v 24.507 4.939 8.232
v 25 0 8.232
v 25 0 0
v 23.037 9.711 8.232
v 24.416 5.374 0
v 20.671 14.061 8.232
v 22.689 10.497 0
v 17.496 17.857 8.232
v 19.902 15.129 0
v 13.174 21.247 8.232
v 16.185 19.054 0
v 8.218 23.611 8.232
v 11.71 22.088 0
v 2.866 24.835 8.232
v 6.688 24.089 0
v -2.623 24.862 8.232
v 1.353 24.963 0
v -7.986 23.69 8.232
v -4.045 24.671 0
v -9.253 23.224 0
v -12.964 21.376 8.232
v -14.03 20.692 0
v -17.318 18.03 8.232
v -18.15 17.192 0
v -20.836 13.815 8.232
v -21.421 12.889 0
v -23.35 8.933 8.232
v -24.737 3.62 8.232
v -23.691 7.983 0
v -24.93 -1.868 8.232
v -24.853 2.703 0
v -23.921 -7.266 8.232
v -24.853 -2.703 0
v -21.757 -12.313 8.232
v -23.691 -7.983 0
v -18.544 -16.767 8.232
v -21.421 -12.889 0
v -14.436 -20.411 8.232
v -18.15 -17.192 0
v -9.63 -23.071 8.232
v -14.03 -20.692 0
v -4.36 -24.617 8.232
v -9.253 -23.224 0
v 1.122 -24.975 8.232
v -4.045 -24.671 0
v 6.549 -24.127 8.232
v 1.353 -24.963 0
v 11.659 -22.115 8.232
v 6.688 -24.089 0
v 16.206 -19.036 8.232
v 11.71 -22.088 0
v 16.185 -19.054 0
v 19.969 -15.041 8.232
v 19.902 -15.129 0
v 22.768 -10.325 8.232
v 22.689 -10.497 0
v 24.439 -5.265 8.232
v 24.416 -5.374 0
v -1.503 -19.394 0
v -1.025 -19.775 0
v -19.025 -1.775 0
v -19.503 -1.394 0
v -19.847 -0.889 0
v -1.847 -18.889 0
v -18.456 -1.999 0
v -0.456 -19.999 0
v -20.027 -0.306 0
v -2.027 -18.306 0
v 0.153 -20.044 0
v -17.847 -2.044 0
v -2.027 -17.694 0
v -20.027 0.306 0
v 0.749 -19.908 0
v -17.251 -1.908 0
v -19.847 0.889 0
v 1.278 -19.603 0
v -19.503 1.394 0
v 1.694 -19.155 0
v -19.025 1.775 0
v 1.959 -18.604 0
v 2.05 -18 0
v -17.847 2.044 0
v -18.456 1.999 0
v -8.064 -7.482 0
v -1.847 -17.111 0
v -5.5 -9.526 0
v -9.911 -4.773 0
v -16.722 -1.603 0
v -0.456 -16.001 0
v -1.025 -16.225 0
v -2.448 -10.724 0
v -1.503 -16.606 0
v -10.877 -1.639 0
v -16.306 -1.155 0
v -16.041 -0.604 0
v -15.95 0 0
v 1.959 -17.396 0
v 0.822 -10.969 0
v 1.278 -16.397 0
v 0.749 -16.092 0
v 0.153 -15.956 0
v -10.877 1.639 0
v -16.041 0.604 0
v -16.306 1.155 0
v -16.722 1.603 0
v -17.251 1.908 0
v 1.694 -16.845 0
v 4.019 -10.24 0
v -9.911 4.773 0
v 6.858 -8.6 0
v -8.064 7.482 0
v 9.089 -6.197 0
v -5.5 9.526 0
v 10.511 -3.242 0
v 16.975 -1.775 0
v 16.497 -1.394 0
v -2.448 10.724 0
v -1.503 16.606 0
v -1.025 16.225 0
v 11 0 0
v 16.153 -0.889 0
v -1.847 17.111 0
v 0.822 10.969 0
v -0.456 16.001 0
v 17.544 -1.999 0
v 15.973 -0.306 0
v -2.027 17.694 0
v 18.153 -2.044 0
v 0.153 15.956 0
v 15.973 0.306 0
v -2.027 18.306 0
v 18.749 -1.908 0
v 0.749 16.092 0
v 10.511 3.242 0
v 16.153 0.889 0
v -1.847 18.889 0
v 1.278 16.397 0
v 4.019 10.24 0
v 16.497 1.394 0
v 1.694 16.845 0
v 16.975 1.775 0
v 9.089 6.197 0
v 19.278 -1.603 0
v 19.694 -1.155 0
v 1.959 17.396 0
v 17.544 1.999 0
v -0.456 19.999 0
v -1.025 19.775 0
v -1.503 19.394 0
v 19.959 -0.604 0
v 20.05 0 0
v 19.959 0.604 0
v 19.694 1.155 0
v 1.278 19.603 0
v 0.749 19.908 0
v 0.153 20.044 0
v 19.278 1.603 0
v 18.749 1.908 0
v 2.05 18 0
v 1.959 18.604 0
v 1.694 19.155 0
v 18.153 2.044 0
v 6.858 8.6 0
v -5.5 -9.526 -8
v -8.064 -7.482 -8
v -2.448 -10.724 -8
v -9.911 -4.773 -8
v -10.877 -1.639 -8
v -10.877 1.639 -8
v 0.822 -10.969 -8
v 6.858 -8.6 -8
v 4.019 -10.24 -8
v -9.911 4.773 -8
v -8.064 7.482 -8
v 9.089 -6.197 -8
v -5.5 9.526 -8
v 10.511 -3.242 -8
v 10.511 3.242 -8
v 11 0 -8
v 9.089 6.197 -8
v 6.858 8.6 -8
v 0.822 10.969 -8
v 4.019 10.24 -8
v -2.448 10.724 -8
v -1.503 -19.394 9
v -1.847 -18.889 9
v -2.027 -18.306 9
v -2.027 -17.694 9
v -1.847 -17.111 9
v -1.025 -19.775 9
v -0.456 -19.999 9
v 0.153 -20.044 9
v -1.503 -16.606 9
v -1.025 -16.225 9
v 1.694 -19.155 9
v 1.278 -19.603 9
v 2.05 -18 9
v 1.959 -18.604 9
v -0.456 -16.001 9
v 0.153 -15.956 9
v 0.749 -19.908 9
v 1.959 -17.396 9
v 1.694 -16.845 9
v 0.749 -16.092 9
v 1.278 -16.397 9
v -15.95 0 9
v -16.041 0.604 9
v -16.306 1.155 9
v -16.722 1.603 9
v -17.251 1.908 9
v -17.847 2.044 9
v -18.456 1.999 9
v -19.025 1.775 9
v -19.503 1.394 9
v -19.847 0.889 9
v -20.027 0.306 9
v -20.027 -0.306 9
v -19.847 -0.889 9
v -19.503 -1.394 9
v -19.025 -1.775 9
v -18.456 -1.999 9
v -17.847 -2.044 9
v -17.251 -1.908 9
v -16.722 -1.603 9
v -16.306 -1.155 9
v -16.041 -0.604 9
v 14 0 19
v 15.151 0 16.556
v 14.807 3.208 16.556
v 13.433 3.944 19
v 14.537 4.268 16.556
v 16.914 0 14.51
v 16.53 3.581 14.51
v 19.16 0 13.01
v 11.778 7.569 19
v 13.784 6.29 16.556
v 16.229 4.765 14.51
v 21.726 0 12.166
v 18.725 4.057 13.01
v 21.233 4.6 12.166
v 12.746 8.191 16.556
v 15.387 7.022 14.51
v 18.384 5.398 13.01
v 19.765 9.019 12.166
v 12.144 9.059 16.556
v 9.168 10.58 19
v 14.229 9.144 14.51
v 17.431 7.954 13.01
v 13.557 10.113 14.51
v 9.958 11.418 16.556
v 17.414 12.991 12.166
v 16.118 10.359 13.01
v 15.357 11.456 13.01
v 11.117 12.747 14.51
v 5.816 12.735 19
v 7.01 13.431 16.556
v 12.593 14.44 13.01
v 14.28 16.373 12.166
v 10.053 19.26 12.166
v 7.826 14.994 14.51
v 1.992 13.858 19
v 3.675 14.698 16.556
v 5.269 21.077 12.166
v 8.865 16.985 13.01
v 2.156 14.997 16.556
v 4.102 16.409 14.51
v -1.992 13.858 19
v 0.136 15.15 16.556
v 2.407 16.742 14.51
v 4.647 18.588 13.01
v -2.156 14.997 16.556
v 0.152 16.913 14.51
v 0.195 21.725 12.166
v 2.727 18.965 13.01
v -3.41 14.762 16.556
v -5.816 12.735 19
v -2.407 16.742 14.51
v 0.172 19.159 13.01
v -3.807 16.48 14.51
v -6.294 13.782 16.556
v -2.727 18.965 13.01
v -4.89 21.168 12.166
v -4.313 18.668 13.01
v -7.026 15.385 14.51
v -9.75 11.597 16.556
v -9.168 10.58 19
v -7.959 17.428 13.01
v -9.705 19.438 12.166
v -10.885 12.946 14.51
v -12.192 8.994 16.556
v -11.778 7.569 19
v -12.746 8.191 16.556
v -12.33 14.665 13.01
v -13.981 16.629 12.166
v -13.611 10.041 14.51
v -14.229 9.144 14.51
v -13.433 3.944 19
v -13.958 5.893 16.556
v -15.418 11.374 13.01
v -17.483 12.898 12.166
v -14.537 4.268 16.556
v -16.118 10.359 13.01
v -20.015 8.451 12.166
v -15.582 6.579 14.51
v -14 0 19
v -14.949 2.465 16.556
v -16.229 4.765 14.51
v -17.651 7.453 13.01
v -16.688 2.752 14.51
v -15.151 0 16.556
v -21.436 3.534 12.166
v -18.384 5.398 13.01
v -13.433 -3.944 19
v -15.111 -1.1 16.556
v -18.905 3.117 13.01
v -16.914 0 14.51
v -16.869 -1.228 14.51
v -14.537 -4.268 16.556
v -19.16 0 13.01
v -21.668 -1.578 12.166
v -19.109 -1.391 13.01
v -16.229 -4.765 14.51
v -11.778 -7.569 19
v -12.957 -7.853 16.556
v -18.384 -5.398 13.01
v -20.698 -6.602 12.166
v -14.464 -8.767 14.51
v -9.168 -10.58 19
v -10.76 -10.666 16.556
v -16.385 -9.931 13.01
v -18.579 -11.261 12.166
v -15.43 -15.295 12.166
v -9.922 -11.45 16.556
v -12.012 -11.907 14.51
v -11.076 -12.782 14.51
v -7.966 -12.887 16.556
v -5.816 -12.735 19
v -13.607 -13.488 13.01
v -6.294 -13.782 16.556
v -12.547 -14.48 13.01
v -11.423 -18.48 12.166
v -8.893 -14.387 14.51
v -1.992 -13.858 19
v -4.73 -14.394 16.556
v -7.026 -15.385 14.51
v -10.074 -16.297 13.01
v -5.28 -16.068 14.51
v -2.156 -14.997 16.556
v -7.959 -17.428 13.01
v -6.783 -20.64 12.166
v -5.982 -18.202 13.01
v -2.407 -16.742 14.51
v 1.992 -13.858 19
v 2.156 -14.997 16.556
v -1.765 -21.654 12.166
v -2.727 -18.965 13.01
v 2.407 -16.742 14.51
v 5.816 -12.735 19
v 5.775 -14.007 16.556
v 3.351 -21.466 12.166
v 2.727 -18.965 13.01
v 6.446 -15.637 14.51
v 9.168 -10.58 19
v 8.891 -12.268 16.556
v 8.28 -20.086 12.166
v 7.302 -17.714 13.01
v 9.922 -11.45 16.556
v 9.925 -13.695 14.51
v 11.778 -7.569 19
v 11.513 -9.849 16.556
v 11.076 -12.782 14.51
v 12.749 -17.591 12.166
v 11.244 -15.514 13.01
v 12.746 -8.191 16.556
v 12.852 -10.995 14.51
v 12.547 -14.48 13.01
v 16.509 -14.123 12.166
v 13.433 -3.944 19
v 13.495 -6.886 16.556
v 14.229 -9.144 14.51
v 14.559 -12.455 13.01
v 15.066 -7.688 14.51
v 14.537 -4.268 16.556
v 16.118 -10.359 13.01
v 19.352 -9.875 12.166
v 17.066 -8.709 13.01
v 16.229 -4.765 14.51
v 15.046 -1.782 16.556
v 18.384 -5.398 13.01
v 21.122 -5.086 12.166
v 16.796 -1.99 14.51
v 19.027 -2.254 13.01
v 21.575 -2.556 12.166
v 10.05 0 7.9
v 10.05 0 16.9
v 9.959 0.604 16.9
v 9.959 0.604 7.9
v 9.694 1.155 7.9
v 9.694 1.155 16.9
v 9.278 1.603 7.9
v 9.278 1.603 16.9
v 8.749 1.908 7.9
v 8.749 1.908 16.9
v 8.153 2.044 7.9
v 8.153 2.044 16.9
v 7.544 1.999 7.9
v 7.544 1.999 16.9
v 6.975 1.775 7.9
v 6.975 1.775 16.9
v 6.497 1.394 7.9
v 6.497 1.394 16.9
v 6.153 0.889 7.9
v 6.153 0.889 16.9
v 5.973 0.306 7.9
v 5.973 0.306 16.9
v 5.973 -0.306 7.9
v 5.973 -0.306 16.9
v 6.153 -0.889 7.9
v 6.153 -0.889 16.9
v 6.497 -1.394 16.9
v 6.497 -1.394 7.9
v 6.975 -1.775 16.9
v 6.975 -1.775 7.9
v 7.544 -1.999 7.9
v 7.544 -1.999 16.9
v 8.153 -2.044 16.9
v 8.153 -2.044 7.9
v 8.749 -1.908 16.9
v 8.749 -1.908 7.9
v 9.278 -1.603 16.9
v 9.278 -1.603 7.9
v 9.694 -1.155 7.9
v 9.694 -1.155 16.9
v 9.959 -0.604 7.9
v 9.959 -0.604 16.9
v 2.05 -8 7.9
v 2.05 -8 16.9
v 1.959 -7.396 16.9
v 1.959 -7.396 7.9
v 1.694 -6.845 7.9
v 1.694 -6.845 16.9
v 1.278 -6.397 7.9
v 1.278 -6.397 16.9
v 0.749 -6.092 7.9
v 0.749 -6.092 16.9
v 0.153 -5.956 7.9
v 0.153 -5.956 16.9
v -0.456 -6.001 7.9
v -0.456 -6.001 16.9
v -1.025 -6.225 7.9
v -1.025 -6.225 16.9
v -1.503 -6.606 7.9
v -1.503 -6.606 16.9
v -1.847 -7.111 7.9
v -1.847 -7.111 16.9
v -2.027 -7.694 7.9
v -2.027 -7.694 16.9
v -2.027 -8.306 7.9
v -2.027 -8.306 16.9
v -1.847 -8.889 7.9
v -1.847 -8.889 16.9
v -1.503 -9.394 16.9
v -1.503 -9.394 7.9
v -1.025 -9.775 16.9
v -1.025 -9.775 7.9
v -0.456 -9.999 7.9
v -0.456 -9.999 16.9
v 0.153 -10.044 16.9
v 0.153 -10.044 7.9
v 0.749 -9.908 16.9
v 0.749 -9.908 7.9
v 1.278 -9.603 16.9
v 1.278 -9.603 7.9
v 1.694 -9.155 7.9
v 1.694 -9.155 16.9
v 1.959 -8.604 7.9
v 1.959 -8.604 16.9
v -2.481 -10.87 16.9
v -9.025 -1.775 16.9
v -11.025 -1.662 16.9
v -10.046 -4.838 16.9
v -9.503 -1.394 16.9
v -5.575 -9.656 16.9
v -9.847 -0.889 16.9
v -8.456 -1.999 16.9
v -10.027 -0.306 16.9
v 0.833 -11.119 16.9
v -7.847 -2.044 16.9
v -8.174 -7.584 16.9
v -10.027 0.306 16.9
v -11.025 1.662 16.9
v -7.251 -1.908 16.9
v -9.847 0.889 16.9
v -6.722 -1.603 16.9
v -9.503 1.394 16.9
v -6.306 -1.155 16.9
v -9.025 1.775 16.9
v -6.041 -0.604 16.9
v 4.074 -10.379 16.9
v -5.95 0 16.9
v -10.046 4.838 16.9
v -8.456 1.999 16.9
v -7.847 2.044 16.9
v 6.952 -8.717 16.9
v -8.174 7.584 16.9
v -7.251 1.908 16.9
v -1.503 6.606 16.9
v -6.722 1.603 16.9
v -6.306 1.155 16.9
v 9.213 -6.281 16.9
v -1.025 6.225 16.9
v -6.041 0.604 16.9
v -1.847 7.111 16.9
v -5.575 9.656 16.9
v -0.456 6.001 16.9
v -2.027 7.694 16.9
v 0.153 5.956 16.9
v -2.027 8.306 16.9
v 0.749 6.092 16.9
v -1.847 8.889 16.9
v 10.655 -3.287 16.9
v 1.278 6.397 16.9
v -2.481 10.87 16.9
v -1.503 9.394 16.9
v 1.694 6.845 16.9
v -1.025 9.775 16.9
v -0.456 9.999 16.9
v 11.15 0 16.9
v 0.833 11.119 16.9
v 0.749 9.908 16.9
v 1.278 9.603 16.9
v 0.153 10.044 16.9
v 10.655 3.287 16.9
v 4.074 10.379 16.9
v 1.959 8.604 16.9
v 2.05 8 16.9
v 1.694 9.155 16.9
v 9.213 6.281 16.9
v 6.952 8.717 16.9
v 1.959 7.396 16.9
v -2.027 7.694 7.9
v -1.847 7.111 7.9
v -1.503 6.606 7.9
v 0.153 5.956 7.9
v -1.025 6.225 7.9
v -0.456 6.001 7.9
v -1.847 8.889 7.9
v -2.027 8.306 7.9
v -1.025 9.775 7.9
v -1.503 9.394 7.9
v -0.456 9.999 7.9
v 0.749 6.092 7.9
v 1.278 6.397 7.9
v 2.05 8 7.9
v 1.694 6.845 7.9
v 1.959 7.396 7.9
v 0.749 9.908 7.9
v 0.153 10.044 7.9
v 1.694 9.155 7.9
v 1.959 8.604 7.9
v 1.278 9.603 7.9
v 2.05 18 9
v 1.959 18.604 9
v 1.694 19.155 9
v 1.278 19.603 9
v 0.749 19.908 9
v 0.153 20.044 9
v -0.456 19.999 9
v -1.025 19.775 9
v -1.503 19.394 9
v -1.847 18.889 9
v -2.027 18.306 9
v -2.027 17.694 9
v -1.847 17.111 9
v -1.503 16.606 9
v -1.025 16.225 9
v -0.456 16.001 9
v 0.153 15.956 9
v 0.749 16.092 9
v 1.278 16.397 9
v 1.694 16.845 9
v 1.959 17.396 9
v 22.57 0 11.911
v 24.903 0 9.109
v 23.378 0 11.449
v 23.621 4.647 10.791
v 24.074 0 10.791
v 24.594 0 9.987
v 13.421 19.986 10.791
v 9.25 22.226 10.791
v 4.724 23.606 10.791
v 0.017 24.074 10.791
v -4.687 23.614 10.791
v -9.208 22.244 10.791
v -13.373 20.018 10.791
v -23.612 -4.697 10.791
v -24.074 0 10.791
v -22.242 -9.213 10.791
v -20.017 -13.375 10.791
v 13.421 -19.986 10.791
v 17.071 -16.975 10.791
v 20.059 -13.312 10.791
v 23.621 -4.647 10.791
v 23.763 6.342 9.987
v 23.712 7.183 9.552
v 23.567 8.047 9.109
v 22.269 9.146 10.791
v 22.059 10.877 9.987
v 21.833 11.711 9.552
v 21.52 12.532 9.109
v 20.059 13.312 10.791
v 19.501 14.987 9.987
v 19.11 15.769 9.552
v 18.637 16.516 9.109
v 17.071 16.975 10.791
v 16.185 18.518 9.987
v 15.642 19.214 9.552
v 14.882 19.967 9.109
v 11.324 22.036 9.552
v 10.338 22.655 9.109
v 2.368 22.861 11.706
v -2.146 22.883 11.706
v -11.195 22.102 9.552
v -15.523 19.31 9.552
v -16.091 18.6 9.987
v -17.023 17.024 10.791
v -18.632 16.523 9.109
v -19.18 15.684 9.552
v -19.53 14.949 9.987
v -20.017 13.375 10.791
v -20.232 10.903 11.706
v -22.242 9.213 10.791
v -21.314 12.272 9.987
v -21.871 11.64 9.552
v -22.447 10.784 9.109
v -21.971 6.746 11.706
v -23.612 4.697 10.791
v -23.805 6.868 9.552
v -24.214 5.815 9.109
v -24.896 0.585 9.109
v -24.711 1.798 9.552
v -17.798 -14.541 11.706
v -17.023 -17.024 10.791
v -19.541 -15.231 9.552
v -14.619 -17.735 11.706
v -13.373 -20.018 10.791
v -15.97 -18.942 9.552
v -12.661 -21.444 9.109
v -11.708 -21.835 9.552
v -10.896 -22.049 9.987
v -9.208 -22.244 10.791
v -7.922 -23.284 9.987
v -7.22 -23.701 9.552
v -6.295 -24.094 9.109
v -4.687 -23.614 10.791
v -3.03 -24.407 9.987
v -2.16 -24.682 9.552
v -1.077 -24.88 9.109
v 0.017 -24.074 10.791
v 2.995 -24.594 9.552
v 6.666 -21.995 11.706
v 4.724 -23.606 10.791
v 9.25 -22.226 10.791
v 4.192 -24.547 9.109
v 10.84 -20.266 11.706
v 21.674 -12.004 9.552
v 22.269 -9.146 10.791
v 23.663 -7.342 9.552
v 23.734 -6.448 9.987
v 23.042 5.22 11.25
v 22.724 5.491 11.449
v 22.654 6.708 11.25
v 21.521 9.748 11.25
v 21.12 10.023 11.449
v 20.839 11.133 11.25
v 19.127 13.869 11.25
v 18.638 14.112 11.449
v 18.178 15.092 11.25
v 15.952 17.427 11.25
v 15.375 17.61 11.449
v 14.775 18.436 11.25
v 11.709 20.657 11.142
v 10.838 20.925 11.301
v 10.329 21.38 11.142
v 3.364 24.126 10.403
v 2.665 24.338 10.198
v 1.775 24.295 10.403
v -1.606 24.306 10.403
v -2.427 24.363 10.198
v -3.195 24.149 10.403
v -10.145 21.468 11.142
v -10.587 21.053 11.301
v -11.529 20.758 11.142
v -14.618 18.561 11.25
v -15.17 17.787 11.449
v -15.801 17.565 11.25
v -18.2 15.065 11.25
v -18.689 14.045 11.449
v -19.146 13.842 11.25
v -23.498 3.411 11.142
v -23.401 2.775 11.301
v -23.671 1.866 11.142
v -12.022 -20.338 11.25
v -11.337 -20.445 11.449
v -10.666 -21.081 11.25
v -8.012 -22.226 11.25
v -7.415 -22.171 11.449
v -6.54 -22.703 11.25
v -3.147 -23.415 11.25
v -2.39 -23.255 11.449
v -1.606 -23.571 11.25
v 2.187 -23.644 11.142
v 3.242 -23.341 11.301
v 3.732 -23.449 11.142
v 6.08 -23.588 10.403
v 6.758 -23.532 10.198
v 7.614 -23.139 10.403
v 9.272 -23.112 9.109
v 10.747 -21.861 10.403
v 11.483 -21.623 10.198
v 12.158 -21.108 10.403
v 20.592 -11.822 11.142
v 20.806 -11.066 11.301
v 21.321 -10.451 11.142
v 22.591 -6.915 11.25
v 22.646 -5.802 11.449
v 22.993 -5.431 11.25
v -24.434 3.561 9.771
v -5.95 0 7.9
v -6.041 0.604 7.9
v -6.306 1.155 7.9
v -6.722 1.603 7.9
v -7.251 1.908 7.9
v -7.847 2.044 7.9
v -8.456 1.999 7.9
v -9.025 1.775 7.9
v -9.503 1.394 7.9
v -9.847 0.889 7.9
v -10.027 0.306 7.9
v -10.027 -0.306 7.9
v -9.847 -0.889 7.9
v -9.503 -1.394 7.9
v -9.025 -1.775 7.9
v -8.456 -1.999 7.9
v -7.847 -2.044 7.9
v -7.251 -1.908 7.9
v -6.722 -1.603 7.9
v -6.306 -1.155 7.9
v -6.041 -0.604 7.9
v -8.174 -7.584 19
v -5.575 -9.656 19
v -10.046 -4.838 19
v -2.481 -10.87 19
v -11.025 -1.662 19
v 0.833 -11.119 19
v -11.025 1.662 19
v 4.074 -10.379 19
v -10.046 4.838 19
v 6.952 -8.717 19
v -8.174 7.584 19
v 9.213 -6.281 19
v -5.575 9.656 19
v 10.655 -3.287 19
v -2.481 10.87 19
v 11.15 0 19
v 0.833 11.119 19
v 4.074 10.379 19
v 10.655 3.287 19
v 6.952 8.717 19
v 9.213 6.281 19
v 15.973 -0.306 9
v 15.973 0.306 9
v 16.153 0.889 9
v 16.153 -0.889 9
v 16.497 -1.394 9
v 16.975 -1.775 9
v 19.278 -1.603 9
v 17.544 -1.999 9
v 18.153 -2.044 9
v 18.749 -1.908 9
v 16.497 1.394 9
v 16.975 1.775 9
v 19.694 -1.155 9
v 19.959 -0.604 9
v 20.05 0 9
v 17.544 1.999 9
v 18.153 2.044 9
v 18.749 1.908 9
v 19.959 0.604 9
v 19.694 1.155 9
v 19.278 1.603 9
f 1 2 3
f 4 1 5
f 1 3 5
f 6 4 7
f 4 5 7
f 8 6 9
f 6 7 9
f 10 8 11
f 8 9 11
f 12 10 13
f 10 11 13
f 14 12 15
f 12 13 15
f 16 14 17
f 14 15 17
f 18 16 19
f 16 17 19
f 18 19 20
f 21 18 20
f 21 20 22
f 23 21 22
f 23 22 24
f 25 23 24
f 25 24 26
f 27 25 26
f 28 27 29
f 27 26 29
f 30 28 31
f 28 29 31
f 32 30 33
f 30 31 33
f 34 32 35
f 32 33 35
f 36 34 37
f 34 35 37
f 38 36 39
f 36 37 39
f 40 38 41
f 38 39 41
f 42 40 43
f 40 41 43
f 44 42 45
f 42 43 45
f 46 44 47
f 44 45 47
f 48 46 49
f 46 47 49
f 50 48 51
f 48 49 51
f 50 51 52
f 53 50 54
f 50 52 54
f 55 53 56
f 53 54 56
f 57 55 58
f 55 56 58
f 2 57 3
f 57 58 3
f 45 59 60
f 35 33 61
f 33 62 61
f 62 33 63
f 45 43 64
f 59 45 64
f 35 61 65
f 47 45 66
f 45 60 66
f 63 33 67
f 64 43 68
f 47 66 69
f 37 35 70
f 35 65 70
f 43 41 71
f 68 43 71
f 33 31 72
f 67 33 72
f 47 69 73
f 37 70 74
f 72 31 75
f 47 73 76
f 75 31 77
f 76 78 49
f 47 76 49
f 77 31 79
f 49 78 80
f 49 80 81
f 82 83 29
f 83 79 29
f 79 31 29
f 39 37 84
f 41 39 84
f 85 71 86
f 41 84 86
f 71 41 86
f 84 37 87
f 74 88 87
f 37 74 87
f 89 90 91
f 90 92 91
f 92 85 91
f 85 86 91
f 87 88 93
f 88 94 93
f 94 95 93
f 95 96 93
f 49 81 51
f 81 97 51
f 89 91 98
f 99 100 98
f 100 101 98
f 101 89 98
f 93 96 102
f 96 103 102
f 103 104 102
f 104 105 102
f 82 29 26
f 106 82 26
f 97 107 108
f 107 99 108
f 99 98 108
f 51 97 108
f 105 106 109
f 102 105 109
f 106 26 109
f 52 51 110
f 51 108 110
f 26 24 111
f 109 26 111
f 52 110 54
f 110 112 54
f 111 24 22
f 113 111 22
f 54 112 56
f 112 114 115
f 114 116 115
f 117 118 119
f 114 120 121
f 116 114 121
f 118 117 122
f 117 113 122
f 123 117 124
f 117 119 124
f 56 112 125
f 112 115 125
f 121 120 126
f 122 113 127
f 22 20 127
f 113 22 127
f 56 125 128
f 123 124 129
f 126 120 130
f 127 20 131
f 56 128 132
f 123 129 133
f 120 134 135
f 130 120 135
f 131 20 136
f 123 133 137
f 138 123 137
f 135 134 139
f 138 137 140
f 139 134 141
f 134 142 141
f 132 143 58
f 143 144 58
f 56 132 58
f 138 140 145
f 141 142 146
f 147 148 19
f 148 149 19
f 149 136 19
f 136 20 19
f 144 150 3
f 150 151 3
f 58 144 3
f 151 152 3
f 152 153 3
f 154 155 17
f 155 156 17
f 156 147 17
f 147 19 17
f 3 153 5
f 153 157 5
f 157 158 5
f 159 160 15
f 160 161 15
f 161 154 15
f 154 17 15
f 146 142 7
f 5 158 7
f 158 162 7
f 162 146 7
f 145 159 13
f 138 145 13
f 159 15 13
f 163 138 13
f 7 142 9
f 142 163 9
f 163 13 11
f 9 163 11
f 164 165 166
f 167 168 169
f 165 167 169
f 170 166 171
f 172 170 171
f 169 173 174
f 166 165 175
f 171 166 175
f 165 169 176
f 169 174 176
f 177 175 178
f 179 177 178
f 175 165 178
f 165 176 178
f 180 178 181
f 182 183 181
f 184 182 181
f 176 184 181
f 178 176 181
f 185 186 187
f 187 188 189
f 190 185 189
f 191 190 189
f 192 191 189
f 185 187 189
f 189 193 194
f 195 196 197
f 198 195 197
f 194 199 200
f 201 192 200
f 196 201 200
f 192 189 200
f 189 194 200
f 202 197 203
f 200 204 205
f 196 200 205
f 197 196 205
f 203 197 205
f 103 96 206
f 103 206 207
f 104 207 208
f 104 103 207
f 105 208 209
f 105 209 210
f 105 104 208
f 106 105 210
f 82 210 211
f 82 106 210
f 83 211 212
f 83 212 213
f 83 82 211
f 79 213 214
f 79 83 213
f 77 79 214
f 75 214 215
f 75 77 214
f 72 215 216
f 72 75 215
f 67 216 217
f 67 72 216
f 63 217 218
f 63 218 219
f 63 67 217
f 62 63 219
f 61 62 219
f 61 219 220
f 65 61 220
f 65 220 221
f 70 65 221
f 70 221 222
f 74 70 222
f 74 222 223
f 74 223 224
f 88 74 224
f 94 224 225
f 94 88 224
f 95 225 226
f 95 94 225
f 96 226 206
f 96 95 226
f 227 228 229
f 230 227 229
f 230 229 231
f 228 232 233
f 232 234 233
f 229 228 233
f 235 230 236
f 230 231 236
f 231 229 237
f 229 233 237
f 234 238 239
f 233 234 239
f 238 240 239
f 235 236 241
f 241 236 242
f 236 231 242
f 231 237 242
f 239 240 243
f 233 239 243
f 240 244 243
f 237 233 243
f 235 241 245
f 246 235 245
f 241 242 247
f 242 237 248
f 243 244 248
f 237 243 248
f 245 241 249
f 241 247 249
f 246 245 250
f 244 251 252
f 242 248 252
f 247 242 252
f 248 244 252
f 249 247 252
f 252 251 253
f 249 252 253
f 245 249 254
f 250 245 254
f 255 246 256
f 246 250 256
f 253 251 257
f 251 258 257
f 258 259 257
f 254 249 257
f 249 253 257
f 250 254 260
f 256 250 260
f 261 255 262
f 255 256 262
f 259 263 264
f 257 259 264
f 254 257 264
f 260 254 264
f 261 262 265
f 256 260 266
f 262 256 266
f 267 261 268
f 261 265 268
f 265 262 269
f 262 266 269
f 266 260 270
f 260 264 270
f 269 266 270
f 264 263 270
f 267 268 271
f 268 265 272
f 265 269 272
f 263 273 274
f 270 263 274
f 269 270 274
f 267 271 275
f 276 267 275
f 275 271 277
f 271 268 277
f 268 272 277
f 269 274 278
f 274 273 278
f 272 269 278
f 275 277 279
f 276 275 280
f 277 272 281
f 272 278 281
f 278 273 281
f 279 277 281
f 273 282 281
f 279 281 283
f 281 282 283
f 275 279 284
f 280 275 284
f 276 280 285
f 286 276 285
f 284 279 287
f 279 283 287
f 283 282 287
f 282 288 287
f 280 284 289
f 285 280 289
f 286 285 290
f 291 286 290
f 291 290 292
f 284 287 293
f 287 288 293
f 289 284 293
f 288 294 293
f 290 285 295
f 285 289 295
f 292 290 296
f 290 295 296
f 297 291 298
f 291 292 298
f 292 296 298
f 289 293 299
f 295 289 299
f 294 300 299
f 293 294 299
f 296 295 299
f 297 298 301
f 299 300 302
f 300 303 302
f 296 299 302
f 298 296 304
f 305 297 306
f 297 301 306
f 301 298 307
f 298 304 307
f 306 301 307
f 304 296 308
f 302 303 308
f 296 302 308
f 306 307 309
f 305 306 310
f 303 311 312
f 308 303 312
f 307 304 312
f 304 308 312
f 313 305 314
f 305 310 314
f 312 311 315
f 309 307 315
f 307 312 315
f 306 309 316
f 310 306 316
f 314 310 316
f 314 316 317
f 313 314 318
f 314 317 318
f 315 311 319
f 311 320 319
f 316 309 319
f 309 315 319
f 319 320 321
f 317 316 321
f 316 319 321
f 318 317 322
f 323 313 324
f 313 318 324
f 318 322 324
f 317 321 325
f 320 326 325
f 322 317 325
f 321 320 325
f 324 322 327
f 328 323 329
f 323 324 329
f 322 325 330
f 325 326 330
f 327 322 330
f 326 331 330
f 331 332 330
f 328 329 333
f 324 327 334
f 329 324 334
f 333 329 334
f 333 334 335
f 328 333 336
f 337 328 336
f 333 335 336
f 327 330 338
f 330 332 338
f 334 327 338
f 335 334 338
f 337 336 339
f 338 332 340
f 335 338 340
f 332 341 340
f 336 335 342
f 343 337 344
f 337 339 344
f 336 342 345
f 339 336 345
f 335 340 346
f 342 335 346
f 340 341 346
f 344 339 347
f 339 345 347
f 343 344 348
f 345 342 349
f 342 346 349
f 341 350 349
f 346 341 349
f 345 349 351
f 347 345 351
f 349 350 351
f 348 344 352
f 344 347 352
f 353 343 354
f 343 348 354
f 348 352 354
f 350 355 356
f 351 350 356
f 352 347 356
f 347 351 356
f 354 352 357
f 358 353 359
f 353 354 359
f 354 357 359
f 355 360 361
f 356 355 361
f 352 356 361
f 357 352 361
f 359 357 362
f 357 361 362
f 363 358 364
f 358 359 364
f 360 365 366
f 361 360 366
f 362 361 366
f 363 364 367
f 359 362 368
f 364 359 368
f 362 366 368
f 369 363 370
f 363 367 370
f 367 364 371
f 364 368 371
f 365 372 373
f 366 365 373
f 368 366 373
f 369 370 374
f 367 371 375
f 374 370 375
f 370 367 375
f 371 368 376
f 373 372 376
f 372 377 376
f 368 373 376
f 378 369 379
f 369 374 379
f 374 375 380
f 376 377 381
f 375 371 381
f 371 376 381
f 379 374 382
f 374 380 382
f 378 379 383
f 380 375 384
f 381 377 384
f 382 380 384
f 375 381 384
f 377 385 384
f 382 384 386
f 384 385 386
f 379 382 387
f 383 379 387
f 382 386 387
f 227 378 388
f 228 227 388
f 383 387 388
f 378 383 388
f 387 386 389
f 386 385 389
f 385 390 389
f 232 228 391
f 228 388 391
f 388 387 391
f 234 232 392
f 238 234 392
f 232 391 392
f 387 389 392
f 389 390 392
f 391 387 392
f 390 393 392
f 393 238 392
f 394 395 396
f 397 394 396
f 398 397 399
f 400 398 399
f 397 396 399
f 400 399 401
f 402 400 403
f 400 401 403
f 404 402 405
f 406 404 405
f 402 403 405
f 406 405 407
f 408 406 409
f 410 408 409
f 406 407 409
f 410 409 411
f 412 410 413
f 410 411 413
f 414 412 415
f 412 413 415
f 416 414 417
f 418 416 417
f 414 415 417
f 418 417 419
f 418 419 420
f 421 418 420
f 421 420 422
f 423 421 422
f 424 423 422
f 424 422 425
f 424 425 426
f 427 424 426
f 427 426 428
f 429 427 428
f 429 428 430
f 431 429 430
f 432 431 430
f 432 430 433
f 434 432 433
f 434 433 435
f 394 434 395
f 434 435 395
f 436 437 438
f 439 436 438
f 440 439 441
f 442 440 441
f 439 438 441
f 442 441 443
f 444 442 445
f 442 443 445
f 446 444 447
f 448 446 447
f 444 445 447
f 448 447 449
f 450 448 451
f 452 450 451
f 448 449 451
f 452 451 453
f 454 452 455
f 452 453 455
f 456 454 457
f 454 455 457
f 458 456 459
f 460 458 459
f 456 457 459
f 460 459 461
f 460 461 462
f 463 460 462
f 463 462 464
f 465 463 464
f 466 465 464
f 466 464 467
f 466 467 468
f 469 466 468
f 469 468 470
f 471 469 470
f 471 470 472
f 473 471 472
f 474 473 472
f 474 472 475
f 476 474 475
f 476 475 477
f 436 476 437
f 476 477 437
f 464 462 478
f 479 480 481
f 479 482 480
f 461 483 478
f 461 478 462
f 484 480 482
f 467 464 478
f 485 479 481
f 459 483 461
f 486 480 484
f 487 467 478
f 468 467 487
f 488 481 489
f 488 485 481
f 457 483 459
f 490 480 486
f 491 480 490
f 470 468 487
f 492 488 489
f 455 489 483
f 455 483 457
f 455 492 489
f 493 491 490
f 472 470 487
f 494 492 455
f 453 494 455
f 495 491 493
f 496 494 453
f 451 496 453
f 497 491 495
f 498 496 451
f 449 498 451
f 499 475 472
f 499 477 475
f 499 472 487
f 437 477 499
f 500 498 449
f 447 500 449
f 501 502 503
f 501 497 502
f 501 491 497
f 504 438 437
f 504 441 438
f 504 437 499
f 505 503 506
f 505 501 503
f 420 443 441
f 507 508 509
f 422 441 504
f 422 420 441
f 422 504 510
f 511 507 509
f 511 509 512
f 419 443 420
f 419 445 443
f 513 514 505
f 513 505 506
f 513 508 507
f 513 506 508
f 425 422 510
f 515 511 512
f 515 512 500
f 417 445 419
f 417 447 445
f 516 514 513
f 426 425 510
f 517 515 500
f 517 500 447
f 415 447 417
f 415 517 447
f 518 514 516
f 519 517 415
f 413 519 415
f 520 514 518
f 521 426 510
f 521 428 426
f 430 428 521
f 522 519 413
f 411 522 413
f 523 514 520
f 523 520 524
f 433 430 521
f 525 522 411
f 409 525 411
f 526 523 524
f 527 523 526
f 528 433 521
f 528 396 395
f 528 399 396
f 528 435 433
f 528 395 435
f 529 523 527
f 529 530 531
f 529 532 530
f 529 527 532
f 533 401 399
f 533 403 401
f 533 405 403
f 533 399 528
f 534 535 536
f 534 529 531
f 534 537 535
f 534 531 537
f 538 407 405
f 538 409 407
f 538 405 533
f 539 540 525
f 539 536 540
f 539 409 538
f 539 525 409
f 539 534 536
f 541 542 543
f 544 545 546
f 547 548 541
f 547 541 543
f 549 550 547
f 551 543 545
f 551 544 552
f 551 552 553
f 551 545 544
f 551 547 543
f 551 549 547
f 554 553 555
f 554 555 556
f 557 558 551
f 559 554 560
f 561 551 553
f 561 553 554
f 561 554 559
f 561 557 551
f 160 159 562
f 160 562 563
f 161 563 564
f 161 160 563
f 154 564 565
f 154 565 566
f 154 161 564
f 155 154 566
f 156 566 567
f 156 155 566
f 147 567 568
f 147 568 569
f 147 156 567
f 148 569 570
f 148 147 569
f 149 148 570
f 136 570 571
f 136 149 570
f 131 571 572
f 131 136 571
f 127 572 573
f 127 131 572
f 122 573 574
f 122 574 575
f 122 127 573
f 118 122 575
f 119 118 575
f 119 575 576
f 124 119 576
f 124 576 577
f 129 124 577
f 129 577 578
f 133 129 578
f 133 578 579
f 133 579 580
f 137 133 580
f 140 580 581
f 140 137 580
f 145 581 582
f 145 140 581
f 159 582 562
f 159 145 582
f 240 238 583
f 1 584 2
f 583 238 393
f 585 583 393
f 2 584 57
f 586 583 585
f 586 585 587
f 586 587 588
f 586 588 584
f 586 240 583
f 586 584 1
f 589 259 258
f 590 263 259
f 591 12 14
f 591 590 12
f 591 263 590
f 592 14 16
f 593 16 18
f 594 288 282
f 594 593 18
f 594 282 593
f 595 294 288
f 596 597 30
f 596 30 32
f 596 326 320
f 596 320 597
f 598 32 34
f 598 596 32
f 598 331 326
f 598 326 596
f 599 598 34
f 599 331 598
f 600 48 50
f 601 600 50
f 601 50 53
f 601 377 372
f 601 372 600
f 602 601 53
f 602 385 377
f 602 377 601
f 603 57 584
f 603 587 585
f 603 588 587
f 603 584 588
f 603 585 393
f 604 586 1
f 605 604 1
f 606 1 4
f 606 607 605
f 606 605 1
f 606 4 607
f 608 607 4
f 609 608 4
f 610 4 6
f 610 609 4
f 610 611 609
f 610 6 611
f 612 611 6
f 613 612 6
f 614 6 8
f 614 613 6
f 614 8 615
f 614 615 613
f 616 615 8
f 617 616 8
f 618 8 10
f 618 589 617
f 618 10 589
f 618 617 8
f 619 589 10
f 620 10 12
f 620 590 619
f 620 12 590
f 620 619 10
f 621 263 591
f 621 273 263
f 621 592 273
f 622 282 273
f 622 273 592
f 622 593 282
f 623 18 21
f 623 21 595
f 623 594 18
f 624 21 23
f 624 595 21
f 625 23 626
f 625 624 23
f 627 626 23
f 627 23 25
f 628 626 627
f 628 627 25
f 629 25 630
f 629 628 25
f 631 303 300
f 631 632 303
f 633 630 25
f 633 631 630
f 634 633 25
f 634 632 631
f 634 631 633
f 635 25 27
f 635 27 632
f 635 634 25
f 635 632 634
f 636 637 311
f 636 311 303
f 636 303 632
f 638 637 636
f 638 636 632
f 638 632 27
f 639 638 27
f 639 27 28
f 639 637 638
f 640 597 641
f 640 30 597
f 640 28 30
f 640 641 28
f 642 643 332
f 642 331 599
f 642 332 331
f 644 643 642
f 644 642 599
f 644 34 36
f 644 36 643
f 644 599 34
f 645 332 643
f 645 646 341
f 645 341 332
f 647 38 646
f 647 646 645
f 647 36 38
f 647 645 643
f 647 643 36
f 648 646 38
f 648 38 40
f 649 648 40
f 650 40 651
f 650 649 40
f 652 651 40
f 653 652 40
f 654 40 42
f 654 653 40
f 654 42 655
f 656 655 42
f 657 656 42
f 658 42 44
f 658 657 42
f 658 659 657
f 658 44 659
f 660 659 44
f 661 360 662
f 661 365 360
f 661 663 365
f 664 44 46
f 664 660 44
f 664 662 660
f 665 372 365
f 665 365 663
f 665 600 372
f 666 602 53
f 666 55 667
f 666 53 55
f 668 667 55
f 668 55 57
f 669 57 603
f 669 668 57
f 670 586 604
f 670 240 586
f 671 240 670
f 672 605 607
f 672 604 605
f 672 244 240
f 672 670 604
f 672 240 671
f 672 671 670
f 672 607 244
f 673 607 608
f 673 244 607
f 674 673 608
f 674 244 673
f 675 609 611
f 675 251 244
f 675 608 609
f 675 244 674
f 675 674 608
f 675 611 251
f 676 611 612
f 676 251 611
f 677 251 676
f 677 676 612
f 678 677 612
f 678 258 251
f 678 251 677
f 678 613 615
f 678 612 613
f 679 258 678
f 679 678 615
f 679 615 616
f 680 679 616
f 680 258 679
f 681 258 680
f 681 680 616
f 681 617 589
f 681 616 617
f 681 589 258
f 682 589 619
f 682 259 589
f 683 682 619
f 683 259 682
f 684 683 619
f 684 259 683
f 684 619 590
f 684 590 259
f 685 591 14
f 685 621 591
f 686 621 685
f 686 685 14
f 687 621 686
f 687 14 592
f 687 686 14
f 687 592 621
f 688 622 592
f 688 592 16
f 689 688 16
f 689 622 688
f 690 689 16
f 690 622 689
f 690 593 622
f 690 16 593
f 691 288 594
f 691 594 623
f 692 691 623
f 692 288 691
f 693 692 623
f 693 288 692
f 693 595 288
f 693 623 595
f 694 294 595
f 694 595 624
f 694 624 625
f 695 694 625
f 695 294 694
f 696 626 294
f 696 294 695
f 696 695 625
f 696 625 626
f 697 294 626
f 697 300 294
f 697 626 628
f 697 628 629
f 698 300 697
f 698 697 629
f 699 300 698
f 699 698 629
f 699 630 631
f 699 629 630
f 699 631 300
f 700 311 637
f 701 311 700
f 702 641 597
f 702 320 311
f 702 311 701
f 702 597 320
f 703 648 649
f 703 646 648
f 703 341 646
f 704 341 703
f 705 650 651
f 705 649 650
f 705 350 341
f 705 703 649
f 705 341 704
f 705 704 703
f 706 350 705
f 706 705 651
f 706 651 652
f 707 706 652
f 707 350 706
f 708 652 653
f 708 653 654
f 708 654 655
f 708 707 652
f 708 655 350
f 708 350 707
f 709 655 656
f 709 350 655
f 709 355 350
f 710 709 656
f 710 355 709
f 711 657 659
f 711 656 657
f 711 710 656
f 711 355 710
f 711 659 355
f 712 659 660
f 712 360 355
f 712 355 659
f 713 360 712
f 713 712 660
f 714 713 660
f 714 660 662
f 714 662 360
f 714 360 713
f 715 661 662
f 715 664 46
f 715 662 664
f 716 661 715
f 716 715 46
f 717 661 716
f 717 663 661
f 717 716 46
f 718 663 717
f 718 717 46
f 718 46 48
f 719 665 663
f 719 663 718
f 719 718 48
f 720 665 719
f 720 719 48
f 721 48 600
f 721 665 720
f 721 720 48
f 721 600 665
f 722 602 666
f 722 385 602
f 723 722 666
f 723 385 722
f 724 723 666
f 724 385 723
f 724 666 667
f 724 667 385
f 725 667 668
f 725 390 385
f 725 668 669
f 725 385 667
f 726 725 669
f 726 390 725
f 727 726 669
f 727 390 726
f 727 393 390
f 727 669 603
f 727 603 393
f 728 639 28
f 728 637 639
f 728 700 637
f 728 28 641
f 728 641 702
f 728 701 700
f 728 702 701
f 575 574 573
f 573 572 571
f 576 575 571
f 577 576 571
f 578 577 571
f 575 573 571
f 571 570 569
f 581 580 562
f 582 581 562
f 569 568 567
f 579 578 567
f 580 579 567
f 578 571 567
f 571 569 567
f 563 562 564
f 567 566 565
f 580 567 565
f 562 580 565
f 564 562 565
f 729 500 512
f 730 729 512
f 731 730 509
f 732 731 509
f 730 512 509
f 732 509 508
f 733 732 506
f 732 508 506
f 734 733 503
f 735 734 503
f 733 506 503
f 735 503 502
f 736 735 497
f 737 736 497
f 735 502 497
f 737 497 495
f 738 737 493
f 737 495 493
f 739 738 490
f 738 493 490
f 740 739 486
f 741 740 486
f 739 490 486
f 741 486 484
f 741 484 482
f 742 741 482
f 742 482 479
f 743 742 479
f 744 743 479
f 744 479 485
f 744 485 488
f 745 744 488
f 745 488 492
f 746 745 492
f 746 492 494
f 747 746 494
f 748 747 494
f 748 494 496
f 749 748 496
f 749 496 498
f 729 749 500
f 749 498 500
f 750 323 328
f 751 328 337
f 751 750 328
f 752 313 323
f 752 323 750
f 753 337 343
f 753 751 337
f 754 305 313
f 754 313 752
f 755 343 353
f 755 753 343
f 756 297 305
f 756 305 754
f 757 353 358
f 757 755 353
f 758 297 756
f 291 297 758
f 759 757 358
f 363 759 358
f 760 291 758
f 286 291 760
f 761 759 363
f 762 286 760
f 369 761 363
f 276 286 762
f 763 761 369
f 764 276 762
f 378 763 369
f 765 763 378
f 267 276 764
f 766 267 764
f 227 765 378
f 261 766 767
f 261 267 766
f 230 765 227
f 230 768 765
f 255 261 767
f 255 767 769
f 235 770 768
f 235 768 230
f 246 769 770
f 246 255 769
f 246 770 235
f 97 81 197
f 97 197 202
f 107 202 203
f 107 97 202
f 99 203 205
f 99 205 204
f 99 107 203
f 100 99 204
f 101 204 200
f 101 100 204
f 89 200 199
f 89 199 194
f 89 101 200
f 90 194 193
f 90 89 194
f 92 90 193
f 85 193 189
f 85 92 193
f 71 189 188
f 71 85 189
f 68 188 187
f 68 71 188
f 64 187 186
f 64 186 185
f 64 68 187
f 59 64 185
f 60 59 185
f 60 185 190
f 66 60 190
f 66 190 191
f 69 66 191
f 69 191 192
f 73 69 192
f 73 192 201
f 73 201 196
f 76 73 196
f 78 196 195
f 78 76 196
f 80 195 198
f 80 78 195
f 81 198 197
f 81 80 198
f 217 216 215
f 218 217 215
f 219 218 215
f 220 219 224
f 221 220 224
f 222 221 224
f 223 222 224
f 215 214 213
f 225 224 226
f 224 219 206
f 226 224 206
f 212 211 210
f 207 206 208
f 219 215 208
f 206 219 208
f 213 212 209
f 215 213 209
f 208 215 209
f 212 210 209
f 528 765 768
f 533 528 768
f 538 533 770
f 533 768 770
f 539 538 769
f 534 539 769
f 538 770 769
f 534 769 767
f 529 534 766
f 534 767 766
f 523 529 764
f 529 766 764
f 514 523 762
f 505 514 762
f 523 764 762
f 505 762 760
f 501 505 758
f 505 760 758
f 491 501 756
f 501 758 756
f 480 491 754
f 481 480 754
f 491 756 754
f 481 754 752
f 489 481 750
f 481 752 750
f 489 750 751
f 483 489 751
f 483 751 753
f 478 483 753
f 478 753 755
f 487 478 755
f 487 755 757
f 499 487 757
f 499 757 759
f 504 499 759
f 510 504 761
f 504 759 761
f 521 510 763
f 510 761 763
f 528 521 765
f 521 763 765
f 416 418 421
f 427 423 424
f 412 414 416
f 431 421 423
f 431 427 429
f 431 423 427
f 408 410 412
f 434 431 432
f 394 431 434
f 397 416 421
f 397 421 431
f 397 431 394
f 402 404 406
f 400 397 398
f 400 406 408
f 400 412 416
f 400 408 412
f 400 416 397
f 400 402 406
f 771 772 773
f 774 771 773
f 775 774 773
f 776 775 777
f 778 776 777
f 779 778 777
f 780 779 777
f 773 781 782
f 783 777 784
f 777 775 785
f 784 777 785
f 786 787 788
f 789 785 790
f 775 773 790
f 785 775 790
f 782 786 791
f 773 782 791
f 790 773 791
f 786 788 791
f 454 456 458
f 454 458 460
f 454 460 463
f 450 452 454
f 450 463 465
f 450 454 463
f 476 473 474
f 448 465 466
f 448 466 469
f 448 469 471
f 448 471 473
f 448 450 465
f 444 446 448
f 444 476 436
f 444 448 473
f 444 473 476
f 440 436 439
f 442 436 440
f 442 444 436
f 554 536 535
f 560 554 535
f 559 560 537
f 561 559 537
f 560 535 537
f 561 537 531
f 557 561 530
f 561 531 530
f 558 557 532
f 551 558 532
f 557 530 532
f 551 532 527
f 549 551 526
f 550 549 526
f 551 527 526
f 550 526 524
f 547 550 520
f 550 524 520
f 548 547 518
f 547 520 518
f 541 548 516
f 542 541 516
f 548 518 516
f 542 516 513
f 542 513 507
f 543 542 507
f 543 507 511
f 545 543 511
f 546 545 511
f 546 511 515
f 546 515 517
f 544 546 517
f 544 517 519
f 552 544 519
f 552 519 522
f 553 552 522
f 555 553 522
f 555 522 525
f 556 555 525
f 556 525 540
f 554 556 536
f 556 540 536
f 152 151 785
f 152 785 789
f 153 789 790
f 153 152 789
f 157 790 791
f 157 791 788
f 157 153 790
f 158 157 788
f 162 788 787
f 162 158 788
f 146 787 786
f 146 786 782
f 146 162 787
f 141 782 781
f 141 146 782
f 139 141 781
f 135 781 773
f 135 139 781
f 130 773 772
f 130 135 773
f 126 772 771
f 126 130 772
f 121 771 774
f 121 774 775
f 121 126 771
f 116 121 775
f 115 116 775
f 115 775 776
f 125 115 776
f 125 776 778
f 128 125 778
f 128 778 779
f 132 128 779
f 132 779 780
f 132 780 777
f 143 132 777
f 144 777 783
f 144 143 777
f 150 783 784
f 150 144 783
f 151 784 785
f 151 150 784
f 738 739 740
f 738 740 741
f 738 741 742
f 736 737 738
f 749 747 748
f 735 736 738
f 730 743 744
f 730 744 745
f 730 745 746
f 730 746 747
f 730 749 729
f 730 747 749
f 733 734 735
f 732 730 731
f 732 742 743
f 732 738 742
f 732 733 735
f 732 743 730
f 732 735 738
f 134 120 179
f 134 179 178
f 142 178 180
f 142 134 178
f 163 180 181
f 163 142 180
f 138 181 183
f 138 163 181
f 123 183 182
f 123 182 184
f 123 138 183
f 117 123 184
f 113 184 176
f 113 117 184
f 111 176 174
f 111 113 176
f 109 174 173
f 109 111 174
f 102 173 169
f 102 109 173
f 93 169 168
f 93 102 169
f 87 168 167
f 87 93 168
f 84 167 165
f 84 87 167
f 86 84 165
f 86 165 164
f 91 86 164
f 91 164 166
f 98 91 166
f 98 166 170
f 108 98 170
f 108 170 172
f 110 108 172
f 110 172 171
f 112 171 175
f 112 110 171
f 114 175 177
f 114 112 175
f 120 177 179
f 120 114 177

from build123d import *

# Parameters (mm, degrees)
SKETCH1_R           = 25
BOSS_EXTRUDE1_DEPTH = 12
BOSS_EXTRUDE2_START = 12
SKETCH2_R           = 14
BOSS_EXTRUDE2_DEPTH = 7
CUT_EXTRUDE1_START  = 19
SKETCH3_R           = 11.15
CUT_EXTRUDE1_DEPTH  = 2.1
FILLET1_R           = 10
FILLET2_R           = 4
SKETCH4_R           = 11
BOSS_EXTRUDE3_DEPTH = 8
CUT_EXTRUDE2_START  = 16.9
SKETCH5_R           = 2.05
CUT_EXTRUDE2_DEPTH  = 9
SKETCH6_R           = 2.05
CUT_EXTRUDE3_DEPTH  = 9


with BuildPart() as part:
    # Sketch1 → Boss-Extrude1 (new body)
    with BuildSketch(Plane.XY):
        Circle(SKETCH1_R)
    extrude(amount=BOSS_EXTRUDE1_DEPTH)

    # Sketch2 → Boss-Extrude2 (add)
    with BuildSketch(Plane.XY.offset(BOSS_EXTRUDE2_START)):
        Circle(SKETCH2_R)
    extrude(amount=BOSS_EXTRUDE2_DEPTH)

    # Sketch3 → Cut-Extrude1 (cut)
    with BuildSketch(Plane.XY.offset(CUT_EXTRUDE1_START)):
        Circle(SKETCH3_R)
    extrude(amount=-CUT_EXTRUDE1_DEPTH, mode=Mode.SUBTRACT)

    # Fillet1
    # the kernel refuses this fillet: 10 mm, written as the material it adds along each edge
    with BuildSketch(Plane(origin=(0, 0, 12), x_dir=(1, 0, 0), z_dir=(0, -1, 0))) as fillet1_piece_1:
        with BuildLine():
            CenterArc((23.539392014, 10), FILLET1_R, 197.457603124, 72.542396876)
            Line((14, 7), (13.80921216, 6.94))
            ThreePointArc((13.80921216, 6.94), (13.8, 3.5), (13.8, 0))
            Line((13.8, 0), (14, -0.2))
            Line((14, -0.2), (23.539392014, -0.2))
            Line((23.539392014, -0.2), (23.539392014, 0))
        make_face()
    revolve(axis=Axis((0, 0, 12), (0, 0, 1)))

    # Fillet2
    fillet2_edges = [part.edges().sort_by_distance(p)[0] for p in [
        (-25, 0, 12),
    ]]
    fillet(fillet2_edges, radius=FILLET2_R)

    # Sketch4 → Boss-Extrude3 (add)
    with BuildSketch(Plane.XY):
        Circle(SKETCH4_R)
    extrude(amount=-BOSS_EXTRUDE3_DEPTH)

    # Sketch5 → Cut-Extrude2 (cut)
    with BuildSketch(Plane.XY.offset(CUT_EXTRUDE2_START)):
        with Locations((0, 8)):
            Circle(SKETCH5_R)
        with Locations((8, 0)):
            Circle(SKETCH5_R)
        with Locations((0, -8)):
            Circle(SKETCH5_R)
        with Locations((-8, 0)):
            Circle(SKETCH5_R)
    extrude(amount=-CUT_EXTRUDE2_DEPTH, mode=Mode.SUBTRACT)

    # Sketch6 → Cut-Extrude3 (cut)
    with BuildSketch(Plane.XY):
        with Locations((0, 18)):
            Circle(SKETCH6_R)
        with Locations((18, 0)):
            Circle(SKETCH6_R)
        with Locations((0, -18)):
            Circle(SKETCH6_R)
        with Locations((-18, 0)):
            Circle(SKETCH6_R)
    extrude(amount=CUT_EXTRUDE3_DEPTH, mode=Mode.SUBTRACT)


solid = part.part
